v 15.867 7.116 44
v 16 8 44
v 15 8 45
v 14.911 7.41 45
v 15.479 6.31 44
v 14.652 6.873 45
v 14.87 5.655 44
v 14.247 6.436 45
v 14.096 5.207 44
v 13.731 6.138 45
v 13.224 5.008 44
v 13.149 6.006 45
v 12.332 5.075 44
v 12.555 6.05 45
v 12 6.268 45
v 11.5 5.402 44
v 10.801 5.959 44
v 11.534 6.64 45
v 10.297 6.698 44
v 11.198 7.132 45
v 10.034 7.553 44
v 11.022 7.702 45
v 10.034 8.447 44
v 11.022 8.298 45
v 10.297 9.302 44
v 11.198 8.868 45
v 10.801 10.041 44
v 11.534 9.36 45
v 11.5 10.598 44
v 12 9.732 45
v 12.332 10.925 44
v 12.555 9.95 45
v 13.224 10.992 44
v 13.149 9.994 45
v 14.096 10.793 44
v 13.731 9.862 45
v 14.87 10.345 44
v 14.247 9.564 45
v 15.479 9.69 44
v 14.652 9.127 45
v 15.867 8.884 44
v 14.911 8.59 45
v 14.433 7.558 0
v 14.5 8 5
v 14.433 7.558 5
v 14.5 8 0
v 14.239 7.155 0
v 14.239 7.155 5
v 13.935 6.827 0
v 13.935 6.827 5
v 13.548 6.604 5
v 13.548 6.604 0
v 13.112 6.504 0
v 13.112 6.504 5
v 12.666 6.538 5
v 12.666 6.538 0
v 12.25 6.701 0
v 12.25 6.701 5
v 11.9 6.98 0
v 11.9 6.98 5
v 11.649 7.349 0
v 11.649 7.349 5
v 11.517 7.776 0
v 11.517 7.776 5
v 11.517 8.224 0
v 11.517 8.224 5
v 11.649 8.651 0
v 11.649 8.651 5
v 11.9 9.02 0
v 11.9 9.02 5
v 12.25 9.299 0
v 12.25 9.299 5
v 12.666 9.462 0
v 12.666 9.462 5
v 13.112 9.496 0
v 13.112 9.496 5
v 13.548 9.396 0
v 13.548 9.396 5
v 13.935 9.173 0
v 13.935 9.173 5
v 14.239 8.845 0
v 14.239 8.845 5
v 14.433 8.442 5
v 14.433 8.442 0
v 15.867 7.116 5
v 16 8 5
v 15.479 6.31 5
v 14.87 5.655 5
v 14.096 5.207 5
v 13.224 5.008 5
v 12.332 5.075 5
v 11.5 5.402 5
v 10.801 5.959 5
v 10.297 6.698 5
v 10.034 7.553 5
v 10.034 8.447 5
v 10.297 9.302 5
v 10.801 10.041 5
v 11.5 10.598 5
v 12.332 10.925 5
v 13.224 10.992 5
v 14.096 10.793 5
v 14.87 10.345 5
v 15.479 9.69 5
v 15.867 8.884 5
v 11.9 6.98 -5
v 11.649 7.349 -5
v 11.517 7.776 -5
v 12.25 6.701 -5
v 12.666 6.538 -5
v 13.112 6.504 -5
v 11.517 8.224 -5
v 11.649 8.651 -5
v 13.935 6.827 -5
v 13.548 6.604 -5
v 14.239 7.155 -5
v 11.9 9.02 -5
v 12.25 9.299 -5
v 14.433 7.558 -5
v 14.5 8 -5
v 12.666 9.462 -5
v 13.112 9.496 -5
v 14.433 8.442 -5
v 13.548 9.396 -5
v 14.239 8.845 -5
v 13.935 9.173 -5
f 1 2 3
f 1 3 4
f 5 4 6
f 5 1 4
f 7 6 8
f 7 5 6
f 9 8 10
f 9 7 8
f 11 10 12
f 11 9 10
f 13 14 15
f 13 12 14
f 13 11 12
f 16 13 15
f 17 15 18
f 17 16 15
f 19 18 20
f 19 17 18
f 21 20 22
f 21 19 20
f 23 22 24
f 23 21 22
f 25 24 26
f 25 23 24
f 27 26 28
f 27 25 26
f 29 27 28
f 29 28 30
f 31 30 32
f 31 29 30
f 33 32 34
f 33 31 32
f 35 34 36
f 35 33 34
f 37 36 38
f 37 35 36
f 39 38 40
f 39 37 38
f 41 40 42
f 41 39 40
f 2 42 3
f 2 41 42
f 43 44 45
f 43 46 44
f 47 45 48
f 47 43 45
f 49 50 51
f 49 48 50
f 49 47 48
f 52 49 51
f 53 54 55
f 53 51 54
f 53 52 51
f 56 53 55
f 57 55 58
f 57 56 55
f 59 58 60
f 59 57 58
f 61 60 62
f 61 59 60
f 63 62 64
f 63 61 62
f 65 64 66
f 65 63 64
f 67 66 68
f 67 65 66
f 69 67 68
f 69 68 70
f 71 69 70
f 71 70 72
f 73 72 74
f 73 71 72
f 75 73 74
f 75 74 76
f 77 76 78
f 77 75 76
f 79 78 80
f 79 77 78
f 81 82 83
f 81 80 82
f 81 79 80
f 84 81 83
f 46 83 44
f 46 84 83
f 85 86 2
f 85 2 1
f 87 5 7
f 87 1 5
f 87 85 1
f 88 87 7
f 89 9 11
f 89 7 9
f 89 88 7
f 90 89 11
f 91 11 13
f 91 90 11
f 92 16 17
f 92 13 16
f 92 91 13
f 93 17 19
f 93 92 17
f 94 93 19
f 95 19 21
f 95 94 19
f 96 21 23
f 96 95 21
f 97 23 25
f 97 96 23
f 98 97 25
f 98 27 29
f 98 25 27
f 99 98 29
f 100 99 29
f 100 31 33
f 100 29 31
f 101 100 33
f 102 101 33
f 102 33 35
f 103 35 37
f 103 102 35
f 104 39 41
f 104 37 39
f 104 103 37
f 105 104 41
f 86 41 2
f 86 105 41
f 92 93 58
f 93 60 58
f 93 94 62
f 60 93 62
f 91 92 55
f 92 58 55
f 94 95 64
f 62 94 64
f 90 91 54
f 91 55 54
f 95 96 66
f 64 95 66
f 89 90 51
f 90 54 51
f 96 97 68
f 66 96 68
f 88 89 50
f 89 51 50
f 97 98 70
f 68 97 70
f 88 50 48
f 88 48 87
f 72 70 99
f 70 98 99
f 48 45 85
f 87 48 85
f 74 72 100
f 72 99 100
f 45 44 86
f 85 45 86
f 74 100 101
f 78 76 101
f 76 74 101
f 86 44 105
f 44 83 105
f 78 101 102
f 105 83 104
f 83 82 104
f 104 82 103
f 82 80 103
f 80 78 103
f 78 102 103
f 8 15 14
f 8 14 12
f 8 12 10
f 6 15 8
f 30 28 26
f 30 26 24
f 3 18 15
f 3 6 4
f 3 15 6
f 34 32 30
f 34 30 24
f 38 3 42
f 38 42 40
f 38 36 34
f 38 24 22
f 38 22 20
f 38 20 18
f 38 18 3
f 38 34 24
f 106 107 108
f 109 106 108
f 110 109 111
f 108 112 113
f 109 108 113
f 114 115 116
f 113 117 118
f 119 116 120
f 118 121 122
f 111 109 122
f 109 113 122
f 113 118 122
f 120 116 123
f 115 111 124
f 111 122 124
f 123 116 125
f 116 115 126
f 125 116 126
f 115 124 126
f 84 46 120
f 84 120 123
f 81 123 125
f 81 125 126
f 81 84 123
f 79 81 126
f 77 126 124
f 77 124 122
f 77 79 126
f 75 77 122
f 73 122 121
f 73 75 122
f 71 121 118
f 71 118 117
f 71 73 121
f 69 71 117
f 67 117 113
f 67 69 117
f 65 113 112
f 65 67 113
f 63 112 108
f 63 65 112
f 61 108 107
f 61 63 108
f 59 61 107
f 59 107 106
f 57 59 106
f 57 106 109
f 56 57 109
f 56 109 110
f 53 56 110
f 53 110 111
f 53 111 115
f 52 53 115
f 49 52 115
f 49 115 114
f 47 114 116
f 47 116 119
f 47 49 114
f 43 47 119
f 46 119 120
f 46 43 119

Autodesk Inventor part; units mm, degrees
ref_plane "YZ Plane" through (0, 0, 0) normal (1, 0, 0) x (0, 1, 0)
ref_plane "XZ Plane" through (0, 0, 0) normal (0, 1, 0) x (-1, 0, 0)
ref_plane "XY Plane" through (0, 0, 0) normal (0, 0, 1) x (1, 0, 0)
sketch "Sketch1" plane through (0, 0, 0) normal (0, 0, 1) x (1, 0, 0)
  circle A0 centre (13, 8) radius 1.5 projected
  circle A1 centre (13, 8) radius 1.5
  point P0 (0, 0)
  dimension "d0" = 3
extrude "Extrusion1" add sketch "Sketch1" along normal mid plane 10
sketch "Sketch2" plane through (13, 8, 5) normal (0, 0, 1) x (1, 0, 0)
  circle A0 centre (0, 0) radius 1.5 projected
  circle A1 centre (0, 0) radius 3
  point P0 (-13, -8)
  dimension "d3" = 6
extrude "Extrusion2" add sketch "Sketch2" along normal blind 40 contours A0 | A1
chamfer "Chamfer1" distance 1 angle 45 1 edges at (10, 8, 45)
properties part number "wheel_pin_1"
